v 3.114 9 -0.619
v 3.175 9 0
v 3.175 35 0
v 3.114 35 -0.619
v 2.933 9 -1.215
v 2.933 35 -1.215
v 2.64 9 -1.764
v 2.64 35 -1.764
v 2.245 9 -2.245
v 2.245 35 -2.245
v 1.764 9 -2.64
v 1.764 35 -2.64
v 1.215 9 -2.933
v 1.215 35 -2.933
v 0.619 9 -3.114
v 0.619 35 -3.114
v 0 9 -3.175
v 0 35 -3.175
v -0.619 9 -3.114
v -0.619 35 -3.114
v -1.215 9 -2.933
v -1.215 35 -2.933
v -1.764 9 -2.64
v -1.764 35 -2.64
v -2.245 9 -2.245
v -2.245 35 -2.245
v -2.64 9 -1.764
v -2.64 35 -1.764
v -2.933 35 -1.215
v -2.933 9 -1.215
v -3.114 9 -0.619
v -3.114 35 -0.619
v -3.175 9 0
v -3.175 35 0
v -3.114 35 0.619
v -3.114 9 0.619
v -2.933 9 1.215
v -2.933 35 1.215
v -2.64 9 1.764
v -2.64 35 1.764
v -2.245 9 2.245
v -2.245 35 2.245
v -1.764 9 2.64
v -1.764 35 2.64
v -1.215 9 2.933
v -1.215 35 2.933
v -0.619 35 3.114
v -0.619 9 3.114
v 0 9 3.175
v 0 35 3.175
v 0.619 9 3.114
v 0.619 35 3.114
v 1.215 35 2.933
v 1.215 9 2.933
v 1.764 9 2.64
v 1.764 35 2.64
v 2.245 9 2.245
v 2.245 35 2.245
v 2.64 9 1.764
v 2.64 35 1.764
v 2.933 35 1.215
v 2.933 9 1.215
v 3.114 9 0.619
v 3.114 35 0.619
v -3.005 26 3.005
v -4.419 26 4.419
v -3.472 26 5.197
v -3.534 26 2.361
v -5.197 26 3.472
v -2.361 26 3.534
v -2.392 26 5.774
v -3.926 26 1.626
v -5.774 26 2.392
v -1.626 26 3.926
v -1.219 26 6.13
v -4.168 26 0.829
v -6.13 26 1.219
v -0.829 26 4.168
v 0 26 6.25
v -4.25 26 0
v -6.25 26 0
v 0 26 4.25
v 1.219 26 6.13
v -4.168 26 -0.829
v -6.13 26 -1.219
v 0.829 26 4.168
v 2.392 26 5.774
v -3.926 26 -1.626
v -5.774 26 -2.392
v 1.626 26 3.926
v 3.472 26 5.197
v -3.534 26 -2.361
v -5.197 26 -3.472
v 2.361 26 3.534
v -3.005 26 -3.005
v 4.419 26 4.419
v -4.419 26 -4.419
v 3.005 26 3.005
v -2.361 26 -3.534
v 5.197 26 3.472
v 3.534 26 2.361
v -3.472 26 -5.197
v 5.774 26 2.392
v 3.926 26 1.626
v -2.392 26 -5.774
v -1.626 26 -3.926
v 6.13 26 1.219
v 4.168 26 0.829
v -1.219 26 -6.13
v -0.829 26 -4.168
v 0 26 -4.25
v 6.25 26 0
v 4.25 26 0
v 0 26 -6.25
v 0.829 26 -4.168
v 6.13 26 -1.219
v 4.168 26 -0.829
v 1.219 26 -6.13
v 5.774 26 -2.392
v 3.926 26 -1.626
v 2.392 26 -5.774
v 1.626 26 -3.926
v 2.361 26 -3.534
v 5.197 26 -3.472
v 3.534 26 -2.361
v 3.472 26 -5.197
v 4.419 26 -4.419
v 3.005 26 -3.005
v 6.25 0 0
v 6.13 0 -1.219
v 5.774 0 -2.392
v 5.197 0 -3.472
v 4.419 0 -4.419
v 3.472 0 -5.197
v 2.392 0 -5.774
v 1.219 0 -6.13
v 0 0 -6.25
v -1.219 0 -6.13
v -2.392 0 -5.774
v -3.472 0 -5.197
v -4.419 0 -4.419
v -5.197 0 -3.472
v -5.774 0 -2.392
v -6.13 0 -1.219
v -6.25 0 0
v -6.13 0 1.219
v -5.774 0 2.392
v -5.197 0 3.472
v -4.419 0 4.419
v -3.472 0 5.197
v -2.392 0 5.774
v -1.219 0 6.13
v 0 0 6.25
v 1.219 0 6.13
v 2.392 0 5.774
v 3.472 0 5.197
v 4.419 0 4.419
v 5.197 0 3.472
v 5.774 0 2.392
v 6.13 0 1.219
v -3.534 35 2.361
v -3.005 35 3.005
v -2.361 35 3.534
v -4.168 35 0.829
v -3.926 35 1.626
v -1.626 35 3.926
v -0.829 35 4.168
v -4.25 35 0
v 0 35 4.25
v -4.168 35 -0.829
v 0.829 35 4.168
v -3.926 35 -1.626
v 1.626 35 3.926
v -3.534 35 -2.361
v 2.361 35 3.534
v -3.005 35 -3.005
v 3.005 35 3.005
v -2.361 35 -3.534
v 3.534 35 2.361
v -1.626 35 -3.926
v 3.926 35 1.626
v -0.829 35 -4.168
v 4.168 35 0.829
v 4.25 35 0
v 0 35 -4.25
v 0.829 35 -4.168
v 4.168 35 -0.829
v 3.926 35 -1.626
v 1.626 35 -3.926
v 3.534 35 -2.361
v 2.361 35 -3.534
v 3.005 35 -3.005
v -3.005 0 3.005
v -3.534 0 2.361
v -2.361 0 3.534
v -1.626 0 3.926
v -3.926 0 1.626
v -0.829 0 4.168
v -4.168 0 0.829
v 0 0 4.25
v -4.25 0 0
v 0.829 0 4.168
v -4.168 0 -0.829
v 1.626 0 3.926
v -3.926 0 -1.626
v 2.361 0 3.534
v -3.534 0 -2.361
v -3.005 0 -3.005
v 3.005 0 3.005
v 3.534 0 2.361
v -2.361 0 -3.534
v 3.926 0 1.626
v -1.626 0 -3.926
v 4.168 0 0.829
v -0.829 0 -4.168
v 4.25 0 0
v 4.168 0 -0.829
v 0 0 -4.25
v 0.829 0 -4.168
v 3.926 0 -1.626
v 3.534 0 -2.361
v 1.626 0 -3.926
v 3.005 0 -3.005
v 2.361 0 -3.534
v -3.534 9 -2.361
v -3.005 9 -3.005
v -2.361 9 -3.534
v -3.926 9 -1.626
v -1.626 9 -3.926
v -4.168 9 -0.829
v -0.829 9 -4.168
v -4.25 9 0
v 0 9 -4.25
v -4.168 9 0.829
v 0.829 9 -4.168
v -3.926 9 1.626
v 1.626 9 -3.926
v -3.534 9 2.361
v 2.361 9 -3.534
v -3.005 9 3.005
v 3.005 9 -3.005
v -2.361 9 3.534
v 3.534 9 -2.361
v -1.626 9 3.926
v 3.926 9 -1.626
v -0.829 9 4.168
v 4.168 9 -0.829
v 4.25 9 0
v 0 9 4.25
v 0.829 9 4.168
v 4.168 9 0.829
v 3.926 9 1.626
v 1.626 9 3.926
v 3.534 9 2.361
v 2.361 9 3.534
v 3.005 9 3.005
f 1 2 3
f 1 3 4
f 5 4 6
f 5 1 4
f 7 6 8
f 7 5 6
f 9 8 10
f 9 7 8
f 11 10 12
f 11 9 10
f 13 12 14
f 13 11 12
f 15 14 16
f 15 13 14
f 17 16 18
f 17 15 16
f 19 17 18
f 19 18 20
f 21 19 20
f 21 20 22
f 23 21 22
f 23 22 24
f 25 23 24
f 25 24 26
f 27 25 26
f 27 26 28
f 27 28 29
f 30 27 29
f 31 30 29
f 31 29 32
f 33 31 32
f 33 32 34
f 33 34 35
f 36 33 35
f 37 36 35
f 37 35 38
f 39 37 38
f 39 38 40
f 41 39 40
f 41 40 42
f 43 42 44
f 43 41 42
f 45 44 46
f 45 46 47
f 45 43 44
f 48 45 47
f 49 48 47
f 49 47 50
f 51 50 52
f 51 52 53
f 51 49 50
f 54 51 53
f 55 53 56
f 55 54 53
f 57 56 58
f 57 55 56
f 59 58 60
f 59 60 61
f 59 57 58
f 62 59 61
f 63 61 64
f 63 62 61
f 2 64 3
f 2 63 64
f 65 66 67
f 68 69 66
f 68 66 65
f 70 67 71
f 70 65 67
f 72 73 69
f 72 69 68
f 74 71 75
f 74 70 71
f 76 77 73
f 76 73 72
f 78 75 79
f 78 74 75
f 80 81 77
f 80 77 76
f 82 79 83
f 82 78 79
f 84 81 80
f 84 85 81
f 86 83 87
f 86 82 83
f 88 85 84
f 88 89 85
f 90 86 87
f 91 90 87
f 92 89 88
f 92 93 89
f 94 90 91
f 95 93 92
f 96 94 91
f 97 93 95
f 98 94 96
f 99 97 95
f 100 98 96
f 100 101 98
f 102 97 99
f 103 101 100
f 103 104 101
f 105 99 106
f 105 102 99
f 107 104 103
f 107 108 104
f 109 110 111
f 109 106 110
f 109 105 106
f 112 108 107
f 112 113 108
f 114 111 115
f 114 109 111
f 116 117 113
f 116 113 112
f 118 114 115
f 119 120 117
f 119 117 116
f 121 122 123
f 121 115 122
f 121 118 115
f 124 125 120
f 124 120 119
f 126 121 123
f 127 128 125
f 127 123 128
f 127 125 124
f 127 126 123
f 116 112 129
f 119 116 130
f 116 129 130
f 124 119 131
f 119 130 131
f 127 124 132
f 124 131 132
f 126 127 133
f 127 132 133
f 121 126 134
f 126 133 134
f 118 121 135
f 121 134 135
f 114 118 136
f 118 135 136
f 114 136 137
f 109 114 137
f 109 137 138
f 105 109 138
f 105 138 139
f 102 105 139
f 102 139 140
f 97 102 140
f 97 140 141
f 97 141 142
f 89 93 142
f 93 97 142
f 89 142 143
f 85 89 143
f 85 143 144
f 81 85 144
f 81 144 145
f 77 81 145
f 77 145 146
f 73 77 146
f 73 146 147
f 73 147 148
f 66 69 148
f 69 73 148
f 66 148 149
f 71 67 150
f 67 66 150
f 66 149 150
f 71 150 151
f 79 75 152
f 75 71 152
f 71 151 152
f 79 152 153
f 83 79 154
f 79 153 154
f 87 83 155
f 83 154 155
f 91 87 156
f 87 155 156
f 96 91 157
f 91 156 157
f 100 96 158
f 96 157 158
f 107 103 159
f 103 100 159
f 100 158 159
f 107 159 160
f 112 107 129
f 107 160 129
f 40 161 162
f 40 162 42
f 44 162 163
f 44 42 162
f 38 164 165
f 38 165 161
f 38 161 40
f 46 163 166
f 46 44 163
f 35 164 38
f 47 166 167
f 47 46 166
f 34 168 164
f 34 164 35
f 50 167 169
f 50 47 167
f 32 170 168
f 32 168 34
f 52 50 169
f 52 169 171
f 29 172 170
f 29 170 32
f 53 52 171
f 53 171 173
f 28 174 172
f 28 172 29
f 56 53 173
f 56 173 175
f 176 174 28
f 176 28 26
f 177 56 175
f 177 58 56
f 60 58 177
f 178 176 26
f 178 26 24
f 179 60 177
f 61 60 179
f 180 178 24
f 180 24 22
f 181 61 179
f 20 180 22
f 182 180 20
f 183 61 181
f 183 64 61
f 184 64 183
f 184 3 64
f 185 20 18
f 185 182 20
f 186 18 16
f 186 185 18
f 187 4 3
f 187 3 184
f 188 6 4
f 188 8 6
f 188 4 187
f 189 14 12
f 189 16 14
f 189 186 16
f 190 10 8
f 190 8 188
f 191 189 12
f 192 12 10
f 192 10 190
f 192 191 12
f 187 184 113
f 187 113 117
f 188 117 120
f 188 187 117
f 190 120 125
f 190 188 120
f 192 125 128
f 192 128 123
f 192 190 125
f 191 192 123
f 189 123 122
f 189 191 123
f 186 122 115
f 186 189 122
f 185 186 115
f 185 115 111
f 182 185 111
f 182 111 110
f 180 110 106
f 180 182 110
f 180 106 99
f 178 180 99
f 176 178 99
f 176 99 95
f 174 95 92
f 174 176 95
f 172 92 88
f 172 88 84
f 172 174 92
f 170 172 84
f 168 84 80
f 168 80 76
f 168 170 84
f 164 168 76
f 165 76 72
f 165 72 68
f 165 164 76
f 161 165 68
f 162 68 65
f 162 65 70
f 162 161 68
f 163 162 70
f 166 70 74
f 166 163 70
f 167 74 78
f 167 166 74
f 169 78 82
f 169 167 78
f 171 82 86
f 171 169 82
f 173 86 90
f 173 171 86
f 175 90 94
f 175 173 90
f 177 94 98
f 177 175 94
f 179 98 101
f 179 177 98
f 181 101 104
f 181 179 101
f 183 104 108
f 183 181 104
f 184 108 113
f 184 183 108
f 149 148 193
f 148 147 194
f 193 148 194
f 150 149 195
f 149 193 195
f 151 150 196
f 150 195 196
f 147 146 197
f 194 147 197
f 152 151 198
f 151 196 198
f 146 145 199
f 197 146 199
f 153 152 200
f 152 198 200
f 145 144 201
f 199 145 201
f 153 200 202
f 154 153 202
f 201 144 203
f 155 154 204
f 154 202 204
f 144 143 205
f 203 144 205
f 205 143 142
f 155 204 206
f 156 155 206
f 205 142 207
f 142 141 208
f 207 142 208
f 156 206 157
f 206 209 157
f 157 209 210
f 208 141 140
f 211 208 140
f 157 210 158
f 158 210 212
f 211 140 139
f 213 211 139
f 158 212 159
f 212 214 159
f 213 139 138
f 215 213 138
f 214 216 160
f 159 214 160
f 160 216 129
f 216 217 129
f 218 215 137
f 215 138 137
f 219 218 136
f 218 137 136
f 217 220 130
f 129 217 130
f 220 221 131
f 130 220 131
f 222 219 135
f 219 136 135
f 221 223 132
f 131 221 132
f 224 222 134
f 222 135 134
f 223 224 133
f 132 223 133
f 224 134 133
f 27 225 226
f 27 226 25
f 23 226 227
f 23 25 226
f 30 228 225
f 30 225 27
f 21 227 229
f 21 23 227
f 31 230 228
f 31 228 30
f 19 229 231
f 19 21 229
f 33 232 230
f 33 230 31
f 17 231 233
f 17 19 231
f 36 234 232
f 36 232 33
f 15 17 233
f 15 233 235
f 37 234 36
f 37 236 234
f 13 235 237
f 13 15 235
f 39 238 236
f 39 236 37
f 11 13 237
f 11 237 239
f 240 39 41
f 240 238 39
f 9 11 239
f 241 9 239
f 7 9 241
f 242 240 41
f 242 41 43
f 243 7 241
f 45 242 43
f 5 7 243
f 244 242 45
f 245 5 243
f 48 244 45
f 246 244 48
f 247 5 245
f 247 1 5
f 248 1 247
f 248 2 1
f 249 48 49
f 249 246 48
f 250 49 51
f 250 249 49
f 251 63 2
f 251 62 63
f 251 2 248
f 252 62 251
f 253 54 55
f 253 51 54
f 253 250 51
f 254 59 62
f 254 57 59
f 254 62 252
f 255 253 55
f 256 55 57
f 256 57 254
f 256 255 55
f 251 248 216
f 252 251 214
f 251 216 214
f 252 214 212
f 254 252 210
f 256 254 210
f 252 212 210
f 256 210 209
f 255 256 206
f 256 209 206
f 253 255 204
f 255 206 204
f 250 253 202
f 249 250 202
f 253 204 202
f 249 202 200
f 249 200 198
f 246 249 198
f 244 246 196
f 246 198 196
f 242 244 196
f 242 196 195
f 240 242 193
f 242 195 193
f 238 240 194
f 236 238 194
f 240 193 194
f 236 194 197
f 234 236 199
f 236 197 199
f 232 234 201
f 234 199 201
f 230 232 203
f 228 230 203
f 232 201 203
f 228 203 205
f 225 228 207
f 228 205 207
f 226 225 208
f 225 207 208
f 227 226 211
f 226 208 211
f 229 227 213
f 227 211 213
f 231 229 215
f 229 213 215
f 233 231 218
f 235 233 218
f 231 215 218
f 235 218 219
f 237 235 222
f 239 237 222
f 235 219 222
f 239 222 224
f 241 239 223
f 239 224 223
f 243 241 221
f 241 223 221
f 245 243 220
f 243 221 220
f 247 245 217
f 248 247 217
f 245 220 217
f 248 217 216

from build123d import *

# Parameters (mm, degrees)
SKETCH1_R           = 6.25
SKETCH1_R_2         = 3.175
BOSS_EXTRUDE1_DEPTH = 35
SKETCH2_OUTSIDE_W   = 22.342
SKETCH2_OUTSIDE_H   = 22.342
SKETCH2_OUTSIDE_R   = 4.25
CUT_EXTRUDE1_DEPTH  = 9
SKETCH3_R           = 4.25
CUT_EXTRUDE2_DEPTH  = 9


with BuildPart() as part:
    # Sketch1 → Boss-Extrude1 (new body)
    with BuildSketch(Plane(origin=(0, 0, 0), x_dir=(1, 0, 0), z_dir=(0, 1, 0))):
        Circle(SKETCH1_R)
        Circle(SKETCH1_R_2, mode=Mode.SUBTRACT)
    extrude(amount=BOSS_EXTRUDE1_DEPTH)

    # Sketch2 outside → Cut-Extrude1 (cut)
    with BuildSketch(Plane(origin=(0, 35, 0), x_dir=(1, 0, 0), z_dir=(0, 1, 0))):
        Rectangle(SKETCH2_OUTSIDE_W, SKETCH2_OUTSIDE_H)
        Circle(SKETCH2_OUTSIDE_R, mode=Mode.SUBTRACT)
    extrude(amount=-CUT_EXTRUDE1_DEPTH, mode=Mode.SUBTRACT)

    # Sketch3 → Cut-Extrude2 (cut)
    with BuildSketch(Plane.XZ):
        Circle(SKETCH3_R)
    extrude(amount=-CUT_EXTRUDE2_DEPTH, mode=Mode.SUBTRACT)


solid = part.part
